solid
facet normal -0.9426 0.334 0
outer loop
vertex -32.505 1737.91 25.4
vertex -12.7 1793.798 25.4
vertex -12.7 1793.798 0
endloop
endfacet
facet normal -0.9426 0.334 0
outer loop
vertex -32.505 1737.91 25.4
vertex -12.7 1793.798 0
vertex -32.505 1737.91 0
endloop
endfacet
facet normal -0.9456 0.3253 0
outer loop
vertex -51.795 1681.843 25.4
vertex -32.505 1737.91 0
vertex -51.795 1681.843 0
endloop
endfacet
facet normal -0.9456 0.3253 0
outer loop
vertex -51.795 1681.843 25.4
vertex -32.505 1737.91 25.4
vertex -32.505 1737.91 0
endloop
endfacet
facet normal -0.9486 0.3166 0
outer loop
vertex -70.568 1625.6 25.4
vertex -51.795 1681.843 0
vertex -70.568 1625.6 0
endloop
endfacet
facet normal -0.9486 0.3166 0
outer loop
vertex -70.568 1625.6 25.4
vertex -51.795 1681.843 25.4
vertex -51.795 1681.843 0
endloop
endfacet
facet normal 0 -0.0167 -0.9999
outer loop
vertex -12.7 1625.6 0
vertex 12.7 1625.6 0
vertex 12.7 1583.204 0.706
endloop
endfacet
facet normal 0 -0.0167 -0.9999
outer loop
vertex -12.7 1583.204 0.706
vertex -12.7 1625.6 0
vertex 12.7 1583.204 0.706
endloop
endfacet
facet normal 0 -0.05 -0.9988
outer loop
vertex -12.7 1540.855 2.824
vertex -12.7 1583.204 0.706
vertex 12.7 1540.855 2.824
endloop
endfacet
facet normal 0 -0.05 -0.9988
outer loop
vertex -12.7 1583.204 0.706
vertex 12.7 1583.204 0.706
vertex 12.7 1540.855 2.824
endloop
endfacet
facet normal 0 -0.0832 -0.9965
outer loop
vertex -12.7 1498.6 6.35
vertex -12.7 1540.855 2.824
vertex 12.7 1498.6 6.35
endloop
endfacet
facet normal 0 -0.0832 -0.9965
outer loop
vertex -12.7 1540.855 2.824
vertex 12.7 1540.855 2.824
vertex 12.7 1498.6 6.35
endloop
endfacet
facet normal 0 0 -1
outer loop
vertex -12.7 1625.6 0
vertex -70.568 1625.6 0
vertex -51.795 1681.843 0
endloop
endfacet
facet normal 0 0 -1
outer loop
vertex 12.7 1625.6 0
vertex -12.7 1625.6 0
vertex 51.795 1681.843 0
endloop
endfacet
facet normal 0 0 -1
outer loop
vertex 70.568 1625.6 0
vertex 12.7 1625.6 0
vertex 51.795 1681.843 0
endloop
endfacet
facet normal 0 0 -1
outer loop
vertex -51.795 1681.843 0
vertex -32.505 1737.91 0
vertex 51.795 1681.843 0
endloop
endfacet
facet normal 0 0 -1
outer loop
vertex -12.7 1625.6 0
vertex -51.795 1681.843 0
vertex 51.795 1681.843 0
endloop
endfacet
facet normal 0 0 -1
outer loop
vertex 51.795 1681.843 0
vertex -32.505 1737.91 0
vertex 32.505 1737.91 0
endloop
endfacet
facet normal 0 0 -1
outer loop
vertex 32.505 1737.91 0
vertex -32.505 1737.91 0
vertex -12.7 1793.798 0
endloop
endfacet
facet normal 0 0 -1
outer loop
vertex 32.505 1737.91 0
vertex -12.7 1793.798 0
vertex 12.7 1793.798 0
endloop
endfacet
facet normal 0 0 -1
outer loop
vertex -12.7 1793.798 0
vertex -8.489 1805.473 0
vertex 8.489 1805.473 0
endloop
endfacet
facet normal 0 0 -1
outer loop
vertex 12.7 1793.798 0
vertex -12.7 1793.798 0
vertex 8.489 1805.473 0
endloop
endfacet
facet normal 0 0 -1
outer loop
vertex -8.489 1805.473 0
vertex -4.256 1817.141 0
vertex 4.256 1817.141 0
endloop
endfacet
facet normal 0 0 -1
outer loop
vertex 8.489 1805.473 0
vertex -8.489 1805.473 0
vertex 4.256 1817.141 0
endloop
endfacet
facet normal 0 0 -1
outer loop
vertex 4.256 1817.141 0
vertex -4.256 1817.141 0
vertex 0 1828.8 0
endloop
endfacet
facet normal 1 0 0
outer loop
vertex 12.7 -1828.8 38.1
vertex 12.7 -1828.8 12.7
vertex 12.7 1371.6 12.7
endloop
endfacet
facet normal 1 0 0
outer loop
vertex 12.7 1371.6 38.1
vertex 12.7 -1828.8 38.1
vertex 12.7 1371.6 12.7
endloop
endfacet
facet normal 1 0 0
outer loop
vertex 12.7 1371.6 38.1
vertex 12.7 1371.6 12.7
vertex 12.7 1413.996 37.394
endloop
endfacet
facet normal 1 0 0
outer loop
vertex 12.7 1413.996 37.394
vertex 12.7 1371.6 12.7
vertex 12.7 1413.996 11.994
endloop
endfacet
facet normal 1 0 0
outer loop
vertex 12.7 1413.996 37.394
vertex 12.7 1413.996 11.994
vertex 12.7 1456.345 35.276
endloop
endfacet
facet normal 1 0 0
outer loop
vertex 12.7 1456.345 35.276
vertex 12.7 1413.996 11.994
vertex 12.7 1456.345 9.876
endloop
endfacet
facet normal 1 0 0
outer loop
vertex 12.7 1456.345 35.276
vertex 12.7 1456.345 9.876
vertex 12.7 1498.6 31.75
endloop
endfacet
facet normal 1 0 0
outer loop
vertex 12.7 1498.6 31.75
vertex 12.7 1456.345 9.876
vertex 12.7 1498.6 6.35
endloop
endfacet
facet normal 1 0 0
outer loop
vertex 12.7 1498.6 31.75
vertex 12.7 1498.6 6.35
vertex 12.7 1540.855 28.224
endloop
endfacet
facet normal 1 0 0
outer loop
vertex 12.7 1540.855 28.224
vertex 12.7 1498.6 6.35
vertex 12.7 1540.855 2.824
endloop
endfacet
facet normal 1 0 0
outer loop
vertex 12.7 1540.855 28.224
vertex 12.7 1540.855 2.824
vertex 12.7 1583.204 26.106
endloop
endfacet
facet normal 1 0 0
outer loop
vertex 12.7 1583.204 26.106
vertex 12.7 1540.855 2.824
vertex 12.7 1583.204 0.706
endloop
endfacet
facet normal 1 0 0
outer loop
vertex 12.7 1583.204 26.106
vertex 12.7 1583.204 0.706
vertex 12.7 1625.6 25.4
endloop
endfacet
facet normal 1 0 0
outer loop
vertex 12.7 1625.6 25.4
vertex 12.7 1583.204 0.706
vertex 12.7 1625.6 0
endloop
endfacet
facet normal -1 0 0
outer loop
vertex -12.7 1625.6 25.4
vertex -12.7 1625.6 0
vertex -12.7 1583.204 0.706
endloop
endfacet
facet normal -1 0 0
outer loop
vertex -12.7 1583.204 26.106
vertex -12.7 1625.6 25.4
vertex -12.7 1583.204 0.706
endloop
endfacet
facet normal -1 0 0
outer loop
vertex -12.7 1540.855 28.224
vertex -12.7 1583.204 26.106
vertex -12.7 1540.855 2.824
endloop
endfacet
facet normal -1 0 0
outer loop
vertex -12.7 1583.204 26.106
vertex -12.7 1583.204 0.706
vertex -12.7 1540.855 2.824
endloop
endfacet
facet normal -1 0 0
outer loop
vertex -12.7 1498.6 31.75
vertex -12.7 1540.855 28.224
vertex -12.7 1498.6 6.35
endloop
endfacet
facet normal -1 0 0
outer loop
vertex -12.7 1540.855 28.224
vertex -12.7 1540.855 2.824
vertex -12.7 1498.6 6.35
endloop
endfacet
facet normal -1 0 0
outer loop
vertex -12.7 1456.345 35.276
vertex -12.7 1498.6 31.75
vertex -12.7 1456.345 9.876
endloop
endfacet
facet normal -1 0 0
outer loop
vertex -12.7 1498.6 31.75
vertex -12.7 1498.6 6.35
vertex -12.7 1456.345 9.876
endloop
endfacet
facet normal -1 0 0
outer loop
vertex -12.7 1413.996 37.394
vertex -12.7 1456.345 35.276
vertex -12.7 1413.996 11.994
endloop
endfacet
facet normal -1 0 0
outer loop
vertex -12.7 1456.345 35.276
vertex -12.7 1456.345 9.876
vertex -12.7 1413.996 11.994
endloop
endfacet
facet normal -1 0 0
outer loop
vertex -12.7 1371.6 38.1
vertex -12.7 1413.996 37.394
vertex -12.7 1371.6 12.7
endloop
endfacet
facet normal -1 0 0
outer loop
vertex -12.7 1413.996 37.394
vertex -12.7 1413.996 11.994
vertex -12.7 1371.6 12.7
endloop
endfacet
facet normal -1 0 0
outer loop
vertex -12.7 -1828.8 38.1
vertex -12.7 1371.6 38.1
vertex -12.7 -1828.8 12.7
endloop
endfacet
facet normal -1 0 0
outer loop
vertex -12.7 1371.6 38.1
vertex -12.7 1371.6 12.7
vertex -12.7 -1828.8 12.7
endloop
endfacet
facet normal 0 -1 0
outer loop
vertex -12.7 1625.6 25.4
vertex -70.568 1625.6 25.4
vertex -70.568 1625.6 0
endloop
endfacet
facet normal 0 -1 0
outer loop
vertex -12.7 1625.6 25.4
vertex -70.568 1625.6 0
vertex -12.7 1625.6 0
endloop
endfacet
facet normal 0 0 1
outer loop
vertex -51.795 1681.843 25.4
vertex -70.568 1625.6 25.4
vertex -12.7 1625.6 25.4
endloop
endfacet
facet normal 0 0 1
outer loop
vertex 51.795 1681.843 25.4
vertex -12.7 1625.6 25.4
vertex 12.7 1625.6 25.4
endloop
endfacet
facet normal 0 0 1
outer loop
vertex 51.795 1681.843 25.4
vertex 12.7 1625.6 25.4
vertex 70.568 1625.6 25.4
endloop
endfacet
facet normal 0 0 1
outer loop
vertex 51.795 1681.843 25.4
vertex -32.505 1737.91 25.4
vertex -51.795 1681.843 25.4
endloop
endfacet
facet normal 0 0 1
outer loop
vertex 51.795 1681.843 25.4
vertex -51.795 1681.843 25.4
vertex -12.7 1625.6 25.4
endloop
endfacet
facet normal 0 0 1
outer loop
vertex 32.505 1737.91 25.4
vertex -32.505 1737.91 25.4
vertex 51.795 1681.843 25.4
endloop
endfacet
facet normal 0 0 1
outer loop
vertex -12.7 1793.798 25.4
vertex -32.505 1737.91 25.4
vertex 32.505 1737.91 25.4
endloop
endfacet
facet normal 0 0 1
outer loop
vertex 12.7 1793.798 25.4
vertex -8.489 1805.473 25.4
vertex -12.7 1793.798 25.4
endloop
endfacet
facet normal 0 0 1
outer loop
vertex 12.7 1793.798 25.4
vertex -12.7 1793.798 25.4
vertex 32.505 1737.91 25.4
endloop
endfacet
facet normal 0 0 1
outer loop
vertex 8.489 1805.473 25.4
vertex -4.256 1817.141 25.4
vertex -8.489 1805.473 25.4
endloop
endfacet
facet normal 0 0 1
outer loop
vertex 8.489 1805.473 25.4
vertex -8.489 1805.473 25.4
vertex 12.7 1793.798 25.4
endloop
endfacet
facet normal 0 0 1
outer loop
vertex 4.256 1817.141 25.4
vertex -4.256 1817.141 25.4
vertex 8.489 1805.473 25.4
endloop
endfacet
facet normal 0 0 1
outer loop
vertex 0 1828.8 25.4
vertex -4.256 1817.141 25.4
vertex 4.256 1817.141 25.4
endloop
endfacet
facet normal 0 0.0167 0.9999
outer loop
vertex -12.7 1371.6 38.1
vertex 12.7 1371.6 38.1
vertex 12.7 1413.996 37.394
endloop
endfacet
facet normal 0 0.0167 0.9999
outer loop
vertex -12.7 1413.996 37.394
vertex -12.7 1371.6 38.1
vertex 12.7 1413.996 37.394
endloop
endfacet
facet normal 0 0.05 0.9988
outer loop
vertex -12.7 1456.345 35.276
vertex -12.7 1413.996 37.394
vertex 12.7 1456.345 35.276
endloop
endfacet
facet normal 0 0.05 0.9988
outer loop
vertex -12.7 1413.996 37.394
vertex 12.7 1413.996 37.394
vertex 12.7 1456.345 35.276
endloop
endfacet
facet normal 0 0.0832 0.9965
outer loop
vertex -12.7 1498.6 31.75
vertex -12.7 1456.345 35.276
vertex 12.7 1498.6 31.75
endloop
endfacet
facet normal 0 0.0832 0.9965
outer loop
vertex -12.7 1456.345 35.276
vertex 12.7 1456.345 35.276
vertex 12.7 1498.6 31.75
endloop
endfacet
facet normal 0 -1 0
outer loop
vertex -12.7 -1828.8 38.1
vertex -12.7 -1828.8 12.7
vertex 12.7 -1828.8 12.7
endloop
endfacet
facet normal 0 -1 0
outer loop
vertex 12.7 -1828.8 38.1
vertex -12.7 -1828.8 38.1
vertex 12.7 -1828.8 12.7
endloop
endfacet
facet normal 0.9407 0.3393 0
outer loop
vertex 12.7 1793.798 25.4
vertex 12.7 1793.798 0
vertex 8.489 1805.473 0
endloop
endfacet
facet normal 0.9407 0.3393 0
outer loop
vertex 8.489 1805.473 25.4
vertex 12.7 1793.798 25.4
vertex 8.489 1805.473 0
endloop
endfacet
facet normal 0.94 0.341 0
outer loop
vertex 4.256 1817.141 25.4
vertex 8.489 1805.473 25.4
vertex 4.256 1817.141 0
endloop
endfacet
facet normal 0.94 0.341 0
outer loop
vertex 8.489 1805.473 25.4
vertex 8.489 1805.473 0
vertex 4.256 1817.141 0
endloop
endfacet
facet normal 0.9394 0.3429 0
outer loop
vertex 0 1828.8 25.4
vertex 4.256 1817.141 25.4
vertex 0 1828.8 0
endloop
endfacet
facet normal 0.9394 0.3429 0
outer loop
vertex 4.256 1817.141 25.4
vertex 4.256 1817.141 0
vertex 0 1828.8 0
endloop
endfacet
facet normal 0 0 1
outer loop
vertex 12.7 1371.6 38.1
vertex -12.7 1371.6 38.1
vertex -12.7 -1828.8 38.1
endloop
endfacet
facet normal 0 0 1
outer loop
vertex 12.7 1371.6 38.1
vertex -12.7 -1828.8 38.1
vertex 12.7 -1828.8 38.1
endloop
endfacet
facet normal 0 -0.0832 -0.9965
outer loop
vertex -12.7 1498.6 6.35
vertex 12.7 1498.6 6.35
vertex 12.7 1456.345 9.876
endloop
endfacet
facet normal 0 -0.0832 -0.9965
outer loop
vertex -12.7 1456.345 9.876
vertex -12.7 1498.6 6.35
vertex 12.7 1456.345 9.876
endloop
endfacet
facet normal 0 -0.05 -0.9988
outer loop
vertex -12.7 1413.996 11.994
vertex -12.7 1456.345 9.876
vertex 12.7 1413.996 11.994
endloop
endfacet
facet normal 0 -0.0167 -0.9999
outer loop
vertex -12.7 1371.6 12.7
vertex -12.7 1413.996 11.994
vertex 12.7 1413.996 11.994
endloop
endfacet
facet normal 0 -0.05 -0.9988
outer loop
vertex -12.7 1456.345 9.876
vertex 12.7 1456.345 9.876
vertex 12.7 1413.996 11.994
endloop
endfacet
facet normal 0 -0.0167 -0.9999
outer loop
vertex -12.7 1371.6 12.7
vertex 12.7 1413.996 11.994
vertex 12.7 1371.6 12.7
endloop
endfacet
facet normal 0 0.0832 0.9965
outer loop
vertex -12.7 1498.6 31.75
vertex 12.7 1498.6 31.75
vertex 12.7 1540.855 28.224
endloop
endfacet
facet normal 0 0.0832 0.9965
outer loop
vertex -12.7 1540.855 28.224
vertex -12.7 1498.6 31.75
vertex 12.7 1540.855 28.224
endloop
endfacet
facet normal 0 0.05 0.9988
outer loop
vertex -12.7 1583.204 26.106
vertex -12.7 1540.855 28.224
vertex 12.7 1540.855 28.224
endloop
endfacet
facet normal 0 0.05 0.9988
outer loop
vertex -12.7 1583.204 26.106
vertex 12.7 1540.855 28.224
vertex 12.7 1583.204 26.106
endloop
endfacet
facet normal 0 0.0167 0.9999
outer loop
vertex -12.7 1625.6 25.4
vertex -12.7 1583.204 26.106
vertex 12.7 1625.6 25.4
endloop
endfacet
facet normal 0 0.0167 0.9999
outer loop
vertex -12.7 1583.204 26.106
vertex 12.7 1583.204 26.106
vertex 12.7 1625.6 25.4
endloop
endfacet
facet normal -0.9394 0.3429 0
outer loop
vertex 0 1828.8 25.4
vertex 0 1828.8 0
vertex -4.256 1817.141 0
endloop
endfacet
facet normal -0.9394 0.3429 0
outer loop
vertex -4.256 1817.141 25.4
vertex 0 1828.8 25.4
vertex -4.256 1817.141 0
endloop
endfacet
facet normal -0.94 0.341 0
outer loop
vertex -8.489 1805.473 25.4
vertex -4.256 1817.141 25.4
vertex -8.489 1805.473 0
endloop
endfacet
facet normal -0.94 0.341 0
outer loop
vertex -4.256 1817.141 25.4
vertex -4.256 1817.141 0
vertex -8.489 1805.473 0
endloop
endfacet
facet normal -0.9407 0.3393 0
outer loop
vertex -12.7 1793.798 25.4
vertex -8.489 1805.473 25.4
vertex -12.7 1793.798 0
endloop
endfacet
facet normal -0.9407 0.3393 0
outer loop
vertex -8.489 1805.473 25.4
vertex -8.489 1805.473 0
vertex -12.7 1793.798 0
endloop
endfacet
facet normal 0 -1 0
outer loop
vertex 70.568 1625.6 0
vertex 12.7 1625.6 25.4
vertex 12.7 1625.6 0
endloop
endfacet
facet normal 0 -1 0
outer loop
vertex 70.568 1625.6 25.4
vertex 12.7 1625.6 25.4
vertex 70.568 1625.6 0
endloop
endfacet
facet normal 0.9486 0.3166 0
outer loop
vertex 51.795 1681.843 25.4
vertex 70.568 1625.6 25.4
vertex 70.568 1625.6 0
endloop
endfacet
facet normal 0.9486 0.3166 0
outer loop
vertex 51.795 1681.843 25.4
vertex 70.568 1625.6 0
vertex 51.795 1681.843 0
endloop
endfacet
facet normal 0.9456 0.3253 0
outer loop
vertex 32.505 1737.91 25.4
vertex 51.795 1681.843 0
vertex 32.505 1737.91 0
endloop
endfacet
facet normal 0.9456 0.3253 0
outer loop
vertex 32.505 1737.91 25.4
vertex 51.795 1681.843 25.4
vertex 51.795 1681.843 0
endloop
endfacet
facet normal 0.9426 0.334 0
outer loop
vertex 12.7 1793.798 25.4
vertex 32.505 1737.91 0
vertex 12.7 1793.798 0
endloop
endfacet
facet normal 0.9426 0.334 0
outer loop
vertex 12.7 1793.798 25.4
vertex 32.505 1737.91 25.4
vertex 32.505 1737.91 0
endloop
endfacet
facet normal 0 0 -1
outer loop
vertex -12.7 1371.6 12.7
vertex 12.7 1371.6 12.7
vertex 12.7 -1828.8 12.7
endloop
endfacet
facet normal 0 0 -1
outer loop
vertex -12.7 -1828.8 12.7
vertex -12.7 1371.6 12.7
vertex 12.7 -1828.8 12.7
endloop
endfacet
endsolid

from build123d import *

# Parameters (mm, degrees)
F1_DEPTH = 38.1
F3_DEPTH = 25.4
F5_DEPTH = 25.4


with BuildPart() as f1:
    # F0 (on Top) → F1 (new body)
    with BuildSketch(Plane.XY):
        with BuildLine():
            ThreePointArc((12.7, 1793.798003), (6.375299, 1811.308181), (0, 1828.8))
            ThreePointArc((0, 1828.8), (-6.375299, 1811.308181), (-12.7, 1793.798003))
            Line((-12.7, 1793.798003), (-12.7, -1828.8))
            Line((-12.7, -1828.8), (0, -1828.8))
            Line((0, -1828.8), (12.7, -1828.8))
            Line((12.7, -1828.8), (12.7, 1793.798003))
        make_face()
    extrude(amount=F1_DEPTH)

    # F2 (on face) → F3 (cut)
    with BuildSketch(Plane.YZ.offset(12.7)):
        with BuildLine():
            Line((-1828.8, 12.7), (-1828.8, 0))
            Line((-1828.8, 0), (1625.6, 0))
            ThreePointArc((1625.6, 0), (1562.020675, 1.588491), (1498.6, 6.35))
            ThreePointArc((1498.6, 6.35), (1435.179325, 11.111509), (1371.6, 12.7))
            Line((1371.6, 12.7), (-1828.8, 12.7))
        make_face()
        with BuildLine():
            Line((1625.6, 25.4), (1828.8, 25.4))
            Line((1828.8, 25.4), (1828.8, 38.1))
            Line((1828.8, 38.1), (1371.6, 38.1))
            ThreePointArc((1371.6, 38.1), (1435.179325, 36.511509), (1498.6, 31.75))
            ThreePointArc((1498.6, 31.75), (1562.020675, 26.988491), (1625.6, 25.4))
        make_face()
    extrude(amount=-F3_DEPTH, mode=Mode.SUBTRACT)

    # F4 (on face) → F5 (join)
    with BuildSketch(Plane.XY.offset(25.4)):
        with BuildLine():
            Line((-70.568017, 1625.6), (-12.7, 1625.6))
            Line((-12.7, 1625.6), (-12.7, 1793.798003))
            ThreePointArc((-12.7, 1793.798003), (-42.214787, 1709.898816), (-70.568017, 1625.6))
        make_face()
        with BuildLine():
            Line((12.7, 1793.798003), (12.7, 1625.6))
            Line((12.7, 1625.6), (70.568017, 1625.6))
            ThreePointArc((70.568017, 1625.6), (42.214787, 1709.898816), (12.7, 1793.798003))
        make_face()
    extrude(amount=-F5_DEPTH)


solid = f1.part
